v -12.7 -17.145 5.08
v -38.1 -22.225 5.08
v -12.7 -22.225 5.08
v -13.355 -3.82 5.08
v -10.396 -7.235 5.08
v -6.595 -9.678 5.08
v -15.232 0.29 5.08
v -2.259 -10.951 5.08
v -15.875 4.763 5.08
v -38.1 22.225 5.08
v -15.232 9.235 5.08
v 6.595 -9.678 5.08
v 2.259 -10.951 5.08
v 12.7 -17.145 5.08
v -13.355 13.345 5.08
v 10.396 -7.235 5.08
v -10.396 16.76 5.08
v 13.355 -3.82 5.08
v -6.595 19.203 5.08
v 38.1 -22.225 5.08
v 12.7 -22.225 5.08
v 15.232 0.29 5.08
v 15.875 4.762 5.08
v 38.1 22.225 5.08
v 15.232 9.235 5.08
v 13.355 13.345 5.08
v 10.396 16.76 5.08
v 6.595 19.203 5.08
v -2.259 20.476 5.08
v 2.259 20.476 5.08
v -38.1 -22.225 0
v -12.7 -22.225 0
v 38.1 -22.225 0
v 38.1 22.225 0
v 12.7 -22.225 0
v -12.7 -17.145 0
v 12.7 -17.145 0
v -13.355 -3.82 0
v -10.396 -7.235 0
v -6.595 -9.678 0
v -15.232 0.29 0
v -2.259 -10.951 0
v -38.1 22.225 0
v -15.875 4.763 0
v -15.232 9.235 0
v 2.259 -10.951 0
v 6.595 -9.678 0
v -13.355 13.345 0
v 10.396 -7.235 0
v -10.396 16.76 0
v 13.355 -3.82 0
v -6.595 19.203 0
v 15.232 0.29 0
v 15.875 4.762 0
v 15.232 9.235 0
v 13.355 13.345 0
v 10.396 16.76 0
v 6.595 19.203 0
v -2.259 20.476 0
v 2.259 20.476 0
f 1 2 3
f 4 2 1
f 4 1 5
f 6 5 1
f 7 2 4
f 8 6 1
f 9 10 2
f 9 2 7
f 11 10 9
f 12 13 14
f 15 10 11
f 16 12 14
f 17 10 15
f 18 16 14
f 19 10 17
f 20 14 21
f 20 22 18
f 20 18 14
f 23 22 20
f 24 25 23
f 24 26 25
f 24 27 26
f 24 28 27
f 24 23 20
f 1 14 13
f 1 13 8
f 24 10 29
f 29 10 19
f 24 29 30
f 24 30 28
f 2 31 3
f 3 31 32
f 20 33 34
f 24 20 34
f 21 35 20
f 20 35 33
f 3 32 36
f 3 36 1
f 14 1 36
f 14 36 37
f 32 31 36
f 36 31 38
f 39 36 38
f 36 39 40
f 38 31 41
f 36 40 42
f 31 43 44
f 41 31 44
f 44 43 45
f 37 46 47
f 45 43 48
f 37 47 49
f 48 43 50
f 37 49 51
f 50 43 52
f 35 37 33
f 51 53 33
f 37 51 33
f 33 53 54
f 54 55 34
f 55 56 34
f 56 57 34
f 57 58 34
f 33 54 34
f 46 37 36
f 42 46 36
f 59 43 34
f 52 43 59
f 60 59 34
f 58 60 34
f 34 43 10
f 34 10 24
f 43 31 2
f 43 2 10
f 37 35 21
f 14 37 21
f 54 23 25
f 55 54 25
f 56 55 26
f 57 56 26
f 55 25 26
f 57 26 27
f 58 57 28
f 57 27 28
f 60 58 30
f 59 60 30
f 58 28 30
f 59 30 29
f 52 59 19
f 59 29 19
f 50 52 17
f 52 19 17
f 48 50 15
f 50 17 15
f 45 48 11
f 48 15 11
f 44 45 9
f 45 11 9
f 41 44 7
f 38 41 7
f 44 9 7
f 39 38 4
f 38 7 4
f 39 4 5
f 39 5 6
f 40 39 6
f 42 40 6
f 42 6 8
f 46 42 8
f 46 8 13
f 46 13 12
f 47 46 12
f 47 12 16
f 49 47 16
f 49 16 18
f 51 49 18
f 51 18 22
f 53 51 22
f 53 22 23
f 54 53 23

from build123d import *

# Parameters (mm, degrees)
SKETCH1_W           = 76.2
SKETCH1_H           = 44.45
BOSS_EXTRUDE1_DEPTH = 5.08
SKETCH4_R           = 15.875
CUT_EXTRUDE2_DEPTH  = 12.7
SKETCH6_W           = 25.4
SKETCH6_H           = 5.08
CUT_EXTRUDE4_DEPTH  = 5.08


with BuildPart() as part:
    # Sketch1 → Boss-Extrude1 (new body)
    with BuildSketch(Plane.XY):
        Rectangle(SKETCH1_W, SKETCH1_H)
    extrude(amount=BOSS_EXTRUDE1_DEPTH)

    # Sketch4 → Cut-Extrude2 (cut)
    with BuildSketch(Plane.XY.offset(5.08)):
        with Locations((0, 4.7625)):
            Circle(SKETCH4_R)
    extrude(amount=-CUT_EXTRUDE2_DEPTH, mode=Mode.SUBTRACT)

    # Sketch6 → Cut-Extrude4 (cut)
    with BuildSketch(Plane.XZ.offset(22.225)):
        with Locations((0, 2.54)):
            Rectangle(SKETCH6_W, SKETCH6_H)
    extrude(amount=-CUT_EXTRUDE4_DEPTH, mode=Mode.SUBTRACT)


solid = part.part
